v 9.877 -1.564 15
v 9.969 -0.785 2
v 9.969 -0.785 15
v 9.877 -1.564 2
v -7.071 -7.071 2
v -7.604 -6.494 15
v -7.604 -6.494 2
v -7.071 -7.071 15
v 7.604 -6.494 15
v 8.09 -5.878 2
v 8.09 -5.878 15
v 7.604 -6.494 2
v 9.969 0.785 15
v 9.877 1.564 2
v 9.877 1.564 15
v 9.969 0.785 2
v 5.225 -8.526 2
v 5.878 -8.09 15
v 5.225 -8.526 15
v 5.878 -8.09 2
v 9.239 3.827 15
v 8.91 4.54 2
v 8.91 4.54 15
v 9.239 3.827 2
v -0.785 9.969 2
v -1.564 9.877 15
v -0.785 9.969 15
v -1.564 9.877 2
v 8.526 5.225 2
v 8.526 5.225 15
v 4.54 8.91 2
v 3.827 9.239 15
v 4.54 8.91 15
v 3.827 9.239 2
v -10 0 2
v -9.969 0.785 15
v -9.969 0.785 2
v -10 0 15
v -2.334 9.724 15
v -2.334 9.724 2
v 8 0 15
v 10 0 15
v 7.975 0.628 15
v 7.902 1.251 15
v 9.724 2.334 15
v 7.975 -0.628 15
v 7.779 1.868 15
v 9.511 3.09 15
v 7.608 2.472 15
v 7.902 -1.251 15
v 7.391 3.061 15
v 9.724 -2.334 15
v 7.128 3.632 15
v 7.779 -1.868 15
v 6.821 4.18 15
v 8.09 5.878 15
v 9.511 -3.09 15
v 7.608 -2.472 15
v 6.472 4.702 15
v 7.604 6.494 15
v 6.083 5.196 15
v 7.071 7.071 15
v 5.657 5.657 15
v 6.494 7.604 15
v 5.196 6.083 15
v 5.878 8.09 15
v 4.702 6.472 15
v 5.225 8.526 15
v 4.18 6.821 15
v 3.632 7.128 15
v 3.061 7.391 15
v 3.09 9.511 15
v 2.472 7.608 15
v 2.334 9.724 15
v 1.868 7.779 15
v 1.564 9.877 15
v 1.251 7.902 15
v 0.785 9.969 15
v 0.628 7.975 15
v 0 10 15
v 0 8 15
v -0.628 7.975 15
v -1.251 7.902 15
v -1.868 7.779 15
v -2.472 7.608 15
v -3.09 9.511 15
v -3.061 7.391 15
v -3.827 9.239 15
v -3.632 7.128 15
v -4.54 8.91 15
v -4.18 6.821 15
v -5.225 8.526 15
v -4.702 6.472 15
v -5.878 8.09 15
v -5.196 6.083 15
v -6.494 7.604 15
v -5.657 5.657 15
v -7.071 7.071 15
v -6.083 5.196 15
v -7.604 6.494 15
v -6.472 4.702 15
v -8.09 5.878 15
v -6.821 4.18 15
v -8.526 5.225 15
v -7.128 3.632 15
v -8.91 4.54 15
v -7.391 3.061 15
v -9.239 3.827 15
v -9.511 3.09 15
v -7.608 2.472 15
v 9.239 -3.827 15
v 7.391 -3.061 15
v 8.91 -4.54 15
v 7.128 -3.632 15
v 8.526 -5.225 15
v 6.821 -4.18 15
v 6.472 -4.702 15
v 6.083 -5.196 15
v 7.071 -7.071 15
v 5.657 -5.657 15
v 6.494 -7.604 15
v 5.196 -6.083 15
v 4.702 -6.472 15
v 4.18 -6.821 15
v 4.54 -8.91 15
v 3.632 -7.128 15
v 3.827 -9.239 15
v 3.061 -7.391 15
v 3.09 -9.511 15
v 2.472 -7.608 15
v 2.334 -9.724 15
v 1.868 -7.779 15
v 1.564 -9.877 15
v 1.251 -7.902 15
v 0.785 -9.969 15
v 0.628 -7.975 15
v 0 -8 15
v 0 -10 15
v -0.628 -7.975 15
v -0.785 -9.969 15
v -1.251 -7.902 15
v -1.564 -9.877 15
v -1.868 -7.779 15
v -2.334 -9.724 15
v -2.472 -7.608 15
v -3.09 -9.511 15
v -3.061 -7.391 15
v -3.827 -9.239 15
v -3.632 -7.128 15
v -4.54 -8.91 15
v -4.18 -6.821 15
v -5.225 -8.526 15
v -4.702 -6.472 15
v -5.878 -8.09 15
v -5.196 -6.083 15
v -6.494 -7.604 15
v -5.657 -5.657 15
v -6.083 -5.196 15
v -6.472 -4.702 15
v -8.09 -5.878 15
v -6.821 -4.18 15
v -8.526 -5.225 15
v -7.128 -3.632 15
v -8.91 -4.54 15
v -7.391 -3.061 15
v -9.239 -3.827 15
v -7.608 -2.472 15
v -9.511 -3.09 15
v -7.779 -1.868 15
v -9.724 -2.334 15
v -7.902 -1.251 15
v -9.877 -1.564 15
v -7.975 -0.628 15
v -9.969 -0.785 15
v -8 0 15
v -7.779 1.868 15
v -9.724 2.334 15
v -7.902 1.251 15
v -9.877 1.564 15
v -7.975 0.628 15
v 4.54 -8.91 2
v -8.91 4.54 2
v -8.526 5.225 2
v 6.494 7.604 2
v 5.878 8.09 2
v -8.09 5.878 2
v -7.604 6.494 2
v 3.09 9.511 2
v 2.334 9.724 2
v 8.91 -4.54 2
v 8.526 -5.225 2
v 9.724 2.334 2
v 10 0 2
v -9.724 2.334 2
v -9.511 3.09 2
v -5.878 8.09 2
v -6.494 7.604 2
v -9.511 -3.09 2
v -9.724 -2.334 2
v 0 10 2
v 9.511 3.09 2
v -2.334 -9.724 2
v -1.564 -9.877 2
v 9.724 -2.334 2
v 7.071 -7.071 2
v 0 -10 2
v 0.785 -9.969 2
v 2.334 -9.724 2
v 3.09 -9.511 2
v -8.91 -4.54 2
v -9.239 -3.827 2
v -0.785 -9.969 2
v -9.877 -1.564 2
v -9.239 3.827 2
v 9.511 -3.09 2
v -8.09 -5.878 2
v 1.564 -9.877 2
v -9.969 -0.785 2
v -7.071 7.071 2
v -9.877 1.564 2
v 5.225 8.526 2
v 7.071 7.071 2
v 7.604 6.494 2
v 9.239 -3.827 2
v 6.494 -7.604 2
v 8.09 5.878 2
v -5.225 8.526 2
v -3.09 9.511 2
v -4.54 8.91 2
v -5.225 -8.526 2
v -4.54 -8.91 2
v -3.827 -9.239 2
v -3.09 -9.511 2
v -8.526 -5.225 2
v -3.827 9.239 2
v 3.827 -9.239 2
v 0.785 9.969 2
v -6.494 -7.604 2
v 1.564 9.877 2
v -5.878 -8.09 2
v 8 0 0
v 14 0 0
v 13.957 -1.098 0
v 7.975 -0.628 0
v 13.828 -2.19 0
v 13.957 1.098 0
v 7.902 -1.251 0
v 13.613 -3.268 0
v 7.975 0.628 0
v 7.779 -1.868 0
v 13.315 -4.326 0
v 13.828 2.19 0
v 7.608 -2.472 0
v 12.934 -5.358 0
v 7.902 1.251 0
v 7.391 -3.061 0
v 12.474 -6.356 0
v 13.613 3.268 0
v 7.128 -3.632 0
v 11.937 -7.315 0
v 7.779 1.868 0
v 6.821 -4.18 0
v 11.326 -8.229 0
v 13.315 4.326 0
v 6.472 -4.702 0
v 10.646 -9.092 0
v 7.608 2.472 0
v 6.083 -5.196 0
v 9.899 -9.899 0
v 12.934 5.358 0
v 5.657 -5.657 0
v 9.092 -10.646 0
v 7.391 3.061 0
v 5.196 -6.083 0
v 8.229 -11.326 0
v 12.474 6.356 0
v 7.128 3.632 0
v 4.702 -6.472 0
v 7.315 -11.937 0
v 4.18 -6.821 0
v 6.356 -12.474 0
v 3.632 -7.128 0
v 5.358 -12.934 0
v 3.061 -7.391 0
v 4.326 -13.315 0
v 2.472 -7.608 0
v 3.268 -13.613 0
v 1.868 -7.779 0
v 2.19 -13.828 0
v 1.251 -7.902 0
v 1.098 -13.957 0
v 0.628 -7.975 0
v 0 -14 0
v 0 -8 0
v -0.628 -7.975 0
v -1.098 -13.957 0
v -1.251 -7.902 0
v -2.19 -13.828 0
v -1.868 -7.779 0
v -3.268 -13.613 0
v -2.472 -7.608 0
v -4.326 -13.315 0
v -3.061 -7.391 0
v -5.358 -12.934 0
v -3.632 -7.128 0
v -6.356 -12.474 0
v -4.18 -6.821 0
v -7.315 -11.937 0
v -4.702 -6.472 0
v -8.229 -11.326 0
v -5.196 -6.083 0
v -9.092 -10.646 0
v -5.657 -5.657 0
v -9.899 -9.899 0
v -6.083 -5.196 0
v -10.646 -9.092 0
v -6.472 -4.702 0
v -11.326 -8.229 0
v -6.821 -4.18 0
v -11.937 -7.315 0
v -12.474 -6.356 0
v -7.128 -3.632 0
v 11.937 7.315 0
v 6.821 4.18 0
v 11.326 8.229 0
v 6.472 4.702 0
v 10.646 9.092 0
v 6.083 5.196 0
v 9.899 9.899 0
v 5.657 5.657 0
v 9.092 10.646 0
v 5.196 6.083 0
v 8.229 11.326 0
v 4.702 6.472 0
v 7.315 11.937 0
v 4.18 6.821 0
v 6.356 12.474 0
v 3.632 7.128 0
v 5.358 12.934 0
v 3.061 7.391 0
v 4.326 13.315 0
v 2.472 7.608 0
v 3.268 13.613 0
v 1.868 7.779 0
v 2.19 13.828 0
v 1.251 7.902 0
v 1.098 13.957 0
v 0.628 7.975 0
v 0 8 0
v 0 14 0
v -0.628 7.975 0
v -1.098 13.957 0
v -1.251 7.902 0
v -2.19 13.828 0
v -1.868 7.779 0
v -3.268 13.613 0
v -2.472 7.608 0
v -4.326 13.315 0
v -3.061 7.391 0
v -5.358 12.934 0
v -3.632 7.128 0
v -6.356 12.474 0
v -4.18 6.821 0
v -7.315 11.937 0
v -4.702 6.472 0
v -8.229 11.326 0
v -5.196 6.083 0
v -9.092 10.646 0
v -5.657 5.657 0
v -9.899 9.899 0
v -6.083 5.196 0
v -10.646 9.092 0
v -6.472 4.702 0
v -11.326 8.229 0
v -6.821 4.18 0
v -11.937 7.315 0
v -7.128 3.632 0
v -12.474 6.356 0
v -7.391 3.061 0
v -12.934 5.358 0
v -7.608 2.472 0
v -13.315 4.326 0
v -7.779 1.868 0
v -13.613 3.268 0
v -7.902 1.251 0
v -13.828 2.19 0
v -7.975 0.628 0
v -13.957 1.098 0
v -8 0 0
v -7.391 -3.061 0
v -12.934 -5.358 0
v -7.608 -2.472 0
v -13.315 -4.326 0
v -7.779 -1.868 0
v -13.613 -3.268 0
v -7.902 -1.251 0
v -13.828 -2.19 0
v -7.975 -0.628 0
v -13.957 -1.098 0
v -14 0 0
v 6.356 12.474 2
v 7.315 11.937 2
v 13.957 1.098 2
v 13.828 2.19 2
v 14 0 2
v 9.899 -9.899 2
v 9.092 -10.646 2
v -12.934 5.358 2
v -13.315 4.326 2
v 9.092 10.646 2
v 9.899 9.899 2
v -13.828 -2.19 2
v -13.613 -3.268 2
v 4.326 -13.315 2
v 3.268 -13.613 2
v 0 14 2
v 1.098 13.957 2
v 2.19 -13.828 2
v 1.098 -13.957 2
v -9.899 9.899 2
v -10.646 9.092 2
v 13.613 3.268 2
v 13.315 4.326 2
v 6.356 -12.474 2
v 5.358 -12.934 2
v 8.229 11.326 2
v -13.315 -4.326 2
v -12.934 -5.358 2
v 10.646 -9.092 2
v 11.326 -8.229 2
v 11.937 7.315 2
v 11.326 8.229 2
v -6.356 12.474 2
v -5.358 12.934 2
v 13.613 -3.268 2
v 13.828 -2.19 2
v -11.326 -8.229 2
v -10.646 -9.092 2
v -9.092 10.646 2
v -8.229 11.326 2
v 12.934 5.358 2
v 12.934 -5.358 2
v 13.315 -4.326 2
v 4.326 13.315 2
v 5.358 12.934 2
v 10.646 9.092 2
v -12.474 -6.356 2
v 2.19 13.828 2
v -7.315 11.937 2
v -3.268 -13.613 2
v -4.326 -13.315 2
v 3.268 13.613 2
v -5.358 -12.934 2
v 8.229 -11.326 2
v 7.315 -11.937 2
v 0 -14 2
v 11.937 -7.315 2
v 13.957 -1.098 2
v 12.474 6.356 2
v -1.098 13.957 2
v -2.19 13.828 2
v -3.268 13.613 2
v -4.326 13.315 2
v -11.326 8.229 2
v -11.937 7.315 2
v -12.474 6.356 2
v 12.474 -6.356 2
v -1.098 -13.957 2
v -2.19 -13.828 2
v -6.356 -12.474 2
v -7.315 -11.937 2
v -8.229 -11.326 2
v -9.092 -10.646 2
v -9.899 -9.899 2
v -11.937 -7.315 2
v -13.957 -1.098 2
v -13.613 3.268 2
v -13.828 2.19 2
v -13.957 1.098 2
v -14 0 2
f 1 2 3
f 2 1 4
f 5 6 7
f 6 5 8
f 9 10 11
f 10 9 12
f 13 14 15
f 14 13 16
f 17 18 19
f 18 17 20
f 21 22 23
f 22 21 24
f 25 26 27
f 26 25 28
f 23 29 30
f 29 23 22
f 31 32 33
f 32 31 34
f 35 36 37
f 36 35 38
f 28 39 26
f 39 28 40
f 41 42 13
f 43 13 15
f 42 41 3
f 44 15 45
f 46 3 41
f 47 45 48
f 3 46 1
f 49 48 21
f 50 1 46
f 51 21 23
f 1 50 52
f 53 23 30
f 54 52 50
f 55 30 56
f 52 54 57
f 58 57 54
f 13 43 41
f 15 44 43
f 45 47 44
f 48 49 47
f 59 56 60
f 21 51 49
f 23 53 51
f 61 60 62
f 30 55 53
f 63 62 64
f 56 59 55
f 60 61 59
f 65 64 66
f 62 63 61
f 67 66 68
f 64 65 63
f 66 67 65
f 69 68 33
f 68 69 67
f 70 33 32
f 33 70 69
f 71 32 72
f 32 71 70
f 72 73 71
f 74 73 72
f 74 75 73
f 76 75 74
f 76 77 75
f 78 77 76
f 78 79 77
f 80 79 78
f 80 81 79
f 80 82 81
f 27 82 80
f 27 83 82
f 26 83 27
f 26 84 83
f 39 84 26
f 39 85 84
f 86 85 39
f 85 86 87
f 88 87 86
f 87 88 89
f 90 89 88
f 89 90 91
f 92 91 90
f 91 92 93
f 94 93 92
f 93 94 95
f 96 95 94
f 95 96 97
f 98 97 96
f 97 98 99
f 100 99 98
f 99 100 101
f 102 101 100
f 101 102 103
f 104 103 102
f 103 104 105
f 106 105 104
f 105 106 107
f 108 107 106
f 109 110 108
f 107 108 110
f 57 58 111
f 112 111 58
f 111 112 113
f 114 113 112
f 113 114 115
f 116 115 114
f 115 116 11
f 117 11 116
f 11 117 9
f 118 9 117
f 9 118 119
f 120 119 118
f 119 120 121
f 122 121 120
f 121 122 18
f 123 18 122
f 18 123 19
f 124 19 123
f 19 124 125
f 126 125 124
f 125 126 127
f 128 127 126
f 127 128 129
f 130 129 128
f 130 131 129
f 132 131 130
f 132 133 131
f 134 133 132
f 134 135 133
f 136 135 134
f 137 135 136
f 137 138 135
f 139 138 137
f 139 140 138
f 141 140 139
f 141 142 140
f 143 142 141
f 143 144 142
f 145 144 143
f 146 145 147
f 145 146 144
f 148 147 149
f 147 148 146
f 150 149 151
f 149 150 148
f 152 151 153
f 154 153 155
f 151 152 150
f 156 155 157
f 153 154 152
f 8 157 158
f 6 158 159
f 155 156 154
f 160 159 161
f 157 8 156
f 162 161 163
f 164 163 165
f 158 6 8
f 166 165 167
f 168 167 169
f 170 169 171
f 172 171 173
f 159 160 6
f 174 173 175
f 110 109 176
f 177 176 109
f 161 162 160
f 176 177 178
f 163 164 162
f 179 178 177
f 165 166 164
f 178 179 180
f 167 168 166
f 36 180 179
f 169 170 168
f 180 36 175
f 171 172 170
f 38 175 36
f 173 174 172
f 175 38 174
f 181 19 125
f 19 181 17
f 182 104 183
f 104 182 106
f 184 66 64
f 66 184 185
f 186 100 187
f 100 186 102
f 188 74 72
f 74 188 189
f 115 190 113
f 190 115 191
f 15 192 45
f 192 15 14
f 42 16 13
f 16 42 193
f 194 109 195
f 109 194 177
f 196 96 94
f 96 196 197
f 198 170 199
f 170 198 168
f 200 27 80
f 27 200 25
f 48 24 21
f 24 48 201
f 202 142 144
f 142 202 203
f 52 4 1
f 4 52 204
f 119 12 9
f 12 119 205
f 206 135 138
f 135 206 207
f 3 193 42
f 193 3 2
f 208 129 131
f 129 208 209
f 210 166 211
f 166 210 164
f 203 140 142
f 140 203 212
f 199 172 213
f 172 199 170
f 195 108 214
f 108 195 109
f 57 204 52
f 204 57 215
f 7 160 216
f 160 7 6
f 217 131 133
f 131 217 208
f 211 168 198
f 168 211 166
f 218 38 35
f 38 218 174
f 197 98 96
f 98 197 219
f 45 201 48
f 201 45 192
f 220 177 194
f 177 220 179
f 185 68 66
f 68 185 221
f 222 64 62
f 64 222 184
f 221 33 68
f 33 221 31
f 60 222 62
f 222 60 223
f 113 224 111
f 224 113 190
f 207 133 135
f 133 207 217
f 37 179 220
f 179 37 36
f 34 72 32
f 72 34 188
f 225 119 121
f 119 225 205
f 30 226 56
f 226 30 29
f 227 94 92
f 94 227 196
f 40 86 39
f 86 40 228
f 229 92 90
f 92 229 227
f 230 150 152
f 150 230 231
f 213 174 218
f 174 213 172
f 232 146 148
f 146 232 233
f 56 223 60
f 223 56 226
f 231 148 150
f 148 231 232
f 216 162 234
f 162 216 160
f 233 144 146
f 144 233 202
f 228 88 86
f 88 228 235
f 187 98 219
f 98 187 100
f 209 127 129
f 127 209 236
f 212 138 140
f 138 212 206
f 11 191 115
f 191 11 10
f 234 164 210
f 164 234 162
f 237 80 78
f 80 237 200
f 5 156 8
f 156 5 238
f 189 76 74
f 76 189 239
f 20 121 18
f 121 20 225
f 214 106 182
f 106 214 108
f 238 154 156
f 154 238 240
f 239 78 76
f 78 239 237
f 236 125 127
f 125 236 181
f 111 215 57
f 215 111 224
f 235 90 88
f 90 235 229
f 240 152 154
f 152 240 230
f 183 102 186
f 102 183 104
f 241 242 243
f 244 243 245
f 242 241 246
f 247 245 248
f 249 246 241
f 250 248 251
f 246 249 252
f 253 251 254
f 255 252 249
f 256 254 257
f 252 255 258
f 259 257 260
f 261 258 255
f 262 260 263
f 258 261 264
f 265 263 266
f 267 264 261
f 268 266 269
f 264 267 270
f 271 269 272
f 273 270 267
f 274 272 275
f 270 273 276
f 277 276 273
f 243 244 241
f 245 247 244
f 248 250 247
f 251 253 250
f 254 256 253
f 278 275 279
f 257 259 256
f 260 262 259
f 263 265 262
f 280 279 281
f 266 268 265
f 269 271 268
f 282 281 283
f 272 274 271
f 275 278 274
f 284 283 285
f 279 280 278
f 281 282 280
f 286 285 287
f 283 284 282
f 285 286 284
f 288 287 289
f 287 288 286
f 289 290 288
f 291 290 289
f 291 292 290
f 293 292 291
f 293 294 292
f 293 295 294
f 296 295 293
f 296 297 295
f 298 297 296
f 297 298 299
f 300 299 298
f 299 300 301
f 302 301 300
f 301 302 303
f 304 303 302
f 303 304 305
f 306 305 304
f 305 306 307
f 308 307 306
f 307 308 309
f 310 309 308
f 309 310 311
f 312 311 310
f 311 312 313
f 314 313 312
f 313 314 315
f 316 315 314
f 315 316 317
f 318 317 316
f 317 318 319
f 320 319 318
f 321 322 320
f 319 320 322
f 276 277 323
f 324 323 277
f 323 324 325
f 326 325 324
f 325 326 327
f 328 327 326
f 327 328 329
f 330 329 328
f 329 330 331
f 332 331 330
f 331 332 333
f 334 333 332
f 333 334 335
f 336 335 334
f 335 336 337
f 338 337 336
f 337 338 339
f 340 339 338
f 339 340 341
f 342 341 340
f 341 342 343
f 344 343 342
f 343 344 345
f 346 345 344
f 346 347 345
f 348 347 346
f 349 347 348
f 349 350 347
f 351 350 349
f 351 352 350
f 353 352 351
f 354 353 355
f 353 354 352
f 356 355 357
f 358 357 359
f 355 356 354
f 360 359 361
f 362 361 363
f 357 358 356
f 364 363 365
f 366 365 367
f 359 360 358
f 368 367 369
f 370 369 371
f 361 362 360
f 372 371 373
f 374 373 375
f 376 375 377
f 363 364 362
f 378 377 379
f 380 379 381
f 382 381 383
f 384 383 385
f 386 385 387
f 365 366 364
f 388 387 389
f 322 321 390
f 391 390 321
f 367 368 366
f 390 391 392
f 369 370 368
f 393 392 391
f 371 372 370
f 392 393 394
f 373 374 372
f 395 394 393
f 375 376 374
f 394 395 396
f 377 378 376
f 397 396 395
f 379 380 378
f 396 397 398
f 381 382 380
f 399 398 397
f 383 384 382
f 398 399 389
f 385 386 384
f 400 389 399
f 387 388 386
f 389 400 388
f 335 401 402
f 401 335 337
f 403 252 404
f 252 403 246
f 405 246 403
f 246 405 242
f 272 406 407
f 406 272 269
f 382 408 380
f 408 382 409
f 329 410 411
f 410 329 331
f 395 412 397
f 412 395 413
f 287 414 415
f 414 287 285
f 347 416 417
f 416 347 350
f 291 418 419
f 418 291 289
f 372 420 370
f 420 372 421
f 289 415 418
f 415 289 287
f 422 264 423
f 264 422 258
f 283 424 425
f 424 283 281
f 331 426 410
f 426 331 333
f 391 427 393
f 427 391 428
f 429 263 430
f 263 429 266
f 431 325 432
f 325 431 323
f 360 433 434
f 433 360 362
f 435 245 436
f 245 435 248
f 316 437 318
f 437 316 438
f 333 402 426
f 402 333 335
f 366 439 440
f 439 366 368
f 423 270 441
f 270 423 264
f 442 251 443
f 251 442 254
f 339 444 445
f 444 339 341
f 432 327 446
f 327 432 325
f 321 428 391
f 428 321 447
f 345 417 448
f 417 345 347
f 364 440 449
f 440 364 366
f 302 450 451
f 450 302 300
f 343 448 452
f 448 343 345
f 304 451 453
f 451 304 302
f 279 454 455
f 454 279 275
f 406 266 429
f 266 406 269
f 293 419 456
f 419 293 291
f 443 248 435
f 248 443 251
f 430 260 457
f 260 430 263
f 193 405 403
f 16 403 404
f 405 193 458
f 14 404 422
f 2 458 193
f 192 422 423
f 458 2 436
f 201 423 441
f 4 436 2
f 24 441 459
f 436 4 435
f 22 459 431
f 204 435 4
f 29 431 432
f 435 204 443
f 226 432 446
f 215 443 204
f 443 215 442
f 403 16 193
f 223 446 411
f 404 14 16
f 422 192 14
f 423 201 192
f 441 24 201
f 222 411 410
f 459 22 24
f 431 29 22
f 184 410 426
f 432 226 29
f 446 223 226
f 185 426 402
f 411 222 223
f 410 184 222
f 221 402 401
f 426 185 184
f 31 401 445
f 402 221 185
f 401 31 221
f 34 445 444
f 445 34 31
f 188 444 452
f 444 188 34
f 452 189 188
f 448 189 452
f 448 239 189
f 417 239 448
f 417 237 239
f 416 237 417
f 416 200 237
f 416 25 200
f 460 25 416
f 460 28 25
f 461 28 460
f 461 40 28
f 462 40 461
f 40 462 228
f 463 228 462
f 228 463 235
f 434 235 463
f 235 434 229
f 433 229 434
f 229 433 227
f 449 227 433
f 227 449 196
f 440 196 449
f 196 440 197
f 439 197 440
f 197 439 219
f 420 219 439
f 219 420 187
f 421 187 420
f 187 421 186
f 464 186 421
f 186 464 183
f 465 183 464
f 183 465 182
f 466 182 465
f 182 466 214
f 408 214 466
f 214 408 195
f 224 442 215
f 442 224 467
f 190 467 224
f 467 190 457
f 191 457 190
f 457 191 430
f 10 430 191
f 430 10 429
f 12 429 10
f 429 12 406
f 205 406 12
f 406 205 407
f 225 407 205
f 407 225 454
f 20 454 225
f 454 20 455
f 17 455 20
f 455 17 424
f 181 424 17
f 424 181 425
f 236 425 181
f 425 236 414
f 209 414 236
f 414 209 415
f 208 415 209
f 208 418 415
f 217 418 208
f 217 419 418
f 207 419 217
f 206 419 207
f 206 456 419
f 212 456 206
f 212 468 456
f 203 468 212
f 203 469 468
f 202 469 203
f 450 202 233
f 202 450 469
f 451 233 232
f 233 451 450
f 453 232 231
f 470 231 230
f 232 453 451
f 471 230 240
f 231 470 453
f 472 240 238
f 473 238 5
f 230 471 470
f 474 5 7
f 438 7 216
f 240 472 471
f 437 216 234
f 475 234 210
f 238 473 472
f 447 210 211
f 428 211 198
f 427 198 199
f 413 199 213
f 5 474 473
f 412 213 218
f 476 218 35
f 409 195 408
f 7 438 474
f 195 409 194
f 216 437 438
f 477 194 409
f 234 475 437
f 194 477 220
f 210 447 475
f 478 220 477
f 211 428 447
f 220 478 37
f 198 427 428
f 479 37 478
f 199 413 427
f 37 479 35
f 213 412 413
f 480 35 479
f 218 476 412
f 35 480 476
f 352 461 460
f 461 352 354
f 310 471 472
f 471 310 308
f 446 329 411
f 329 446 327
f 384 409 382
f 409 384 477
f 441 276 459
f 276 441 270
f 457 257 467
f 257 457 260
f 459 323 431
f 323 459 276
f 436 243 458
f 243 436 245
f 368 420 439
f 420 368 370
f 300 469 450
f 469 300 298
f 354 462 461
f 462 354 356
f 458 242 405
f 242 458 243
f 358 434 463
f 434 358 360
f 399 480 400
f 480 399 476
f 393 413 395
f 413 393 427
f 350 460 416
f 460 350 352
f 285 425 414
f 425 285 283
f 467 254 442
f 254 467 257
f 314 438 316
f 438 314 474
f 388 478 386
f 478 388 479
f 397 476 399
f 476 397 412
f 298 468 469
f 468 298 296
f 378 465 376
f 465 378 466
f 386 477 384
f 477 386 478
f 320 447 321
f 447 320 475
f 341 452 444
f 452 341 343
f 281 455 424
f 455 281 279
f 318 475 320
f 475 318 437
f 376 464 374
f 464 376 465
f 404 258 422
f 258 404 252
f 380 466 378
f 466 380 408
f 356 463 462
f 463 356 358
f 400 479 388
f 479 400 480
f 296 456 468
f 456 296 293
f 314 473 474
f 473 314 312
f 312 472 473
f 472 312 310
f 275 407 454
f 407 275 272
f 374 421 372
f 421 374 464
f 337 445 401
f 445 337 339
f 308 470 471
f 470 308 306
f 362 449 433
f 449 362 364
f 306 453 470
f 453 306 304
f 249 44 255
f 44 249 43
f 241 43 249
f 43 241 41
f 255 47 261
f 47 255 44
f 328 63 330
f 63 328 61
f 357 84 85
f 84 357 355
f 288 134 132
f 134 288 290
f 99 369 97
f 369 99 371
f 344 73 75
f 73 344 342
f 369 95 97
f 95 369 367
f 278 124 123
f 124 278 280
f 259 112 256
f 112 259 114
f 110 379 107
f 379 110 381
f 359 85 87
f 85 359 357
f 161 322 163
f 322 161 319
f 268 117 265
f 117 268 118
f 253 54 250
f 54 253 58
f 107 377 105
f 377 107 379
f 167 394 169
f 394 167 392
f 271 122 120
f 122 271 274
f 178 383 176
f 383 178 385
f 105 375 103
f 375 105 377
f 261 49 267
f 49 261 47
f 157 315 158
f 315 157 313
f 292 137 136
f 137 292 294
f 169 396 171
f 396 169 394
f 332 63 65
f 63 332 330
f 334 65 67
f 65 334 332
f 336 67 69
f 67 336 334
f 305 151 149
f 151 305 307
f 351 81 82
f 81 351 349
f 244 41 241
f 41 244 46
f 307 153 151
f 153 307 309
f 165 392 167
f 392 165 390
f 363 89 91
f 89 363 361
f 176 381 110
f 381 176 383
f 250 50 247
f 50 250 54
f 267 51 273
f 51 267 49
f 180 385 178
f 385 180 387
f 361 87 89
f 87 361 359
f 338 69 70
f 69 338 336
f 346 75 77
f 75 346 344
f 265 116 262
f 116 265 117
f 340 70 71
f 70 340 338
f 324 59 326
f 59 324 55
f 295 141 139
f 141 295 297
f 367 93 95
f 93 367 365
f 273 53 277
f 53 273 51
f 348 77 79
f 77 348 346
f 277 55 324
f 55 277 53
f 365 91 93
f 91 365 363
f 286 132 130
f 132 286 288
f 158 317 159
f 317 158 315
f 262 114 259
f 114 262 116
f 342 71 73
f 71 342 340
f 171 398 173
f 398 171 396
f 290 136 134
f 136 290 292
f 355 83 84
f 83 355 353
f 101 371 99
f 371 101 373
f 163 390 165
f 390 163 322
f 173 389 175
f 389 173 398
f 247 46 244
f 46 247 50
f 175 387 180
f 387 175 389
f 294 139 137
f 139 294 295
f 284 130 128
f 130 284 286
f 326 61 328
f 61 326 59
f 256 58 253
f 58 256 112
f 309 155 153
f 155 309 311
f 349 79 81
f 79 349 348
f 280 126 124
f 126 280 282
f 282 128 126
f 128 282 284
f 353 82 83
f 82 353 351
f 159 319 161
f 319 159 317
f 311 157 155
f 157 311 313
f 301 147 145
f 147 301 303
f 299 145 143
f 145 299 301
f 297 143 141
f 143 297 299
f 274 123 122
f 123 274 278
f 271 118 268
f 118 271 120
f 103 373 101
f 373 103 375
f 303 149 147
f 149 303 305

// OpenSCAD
// Parametric opaque sleeve to isolate lens from IR window. Measure optics first.
inner_d=16;wall=2;height=15;flange_d=28;flange_z=2;
$fn=80;
difference(){
 union(){cylinder(d=inner_d+2*wall,h=height);cylinder(d=flange_d,h=flange_z);}
 translate([0,0,-1])cylinder(d=inner_d,h=height+2);
}
